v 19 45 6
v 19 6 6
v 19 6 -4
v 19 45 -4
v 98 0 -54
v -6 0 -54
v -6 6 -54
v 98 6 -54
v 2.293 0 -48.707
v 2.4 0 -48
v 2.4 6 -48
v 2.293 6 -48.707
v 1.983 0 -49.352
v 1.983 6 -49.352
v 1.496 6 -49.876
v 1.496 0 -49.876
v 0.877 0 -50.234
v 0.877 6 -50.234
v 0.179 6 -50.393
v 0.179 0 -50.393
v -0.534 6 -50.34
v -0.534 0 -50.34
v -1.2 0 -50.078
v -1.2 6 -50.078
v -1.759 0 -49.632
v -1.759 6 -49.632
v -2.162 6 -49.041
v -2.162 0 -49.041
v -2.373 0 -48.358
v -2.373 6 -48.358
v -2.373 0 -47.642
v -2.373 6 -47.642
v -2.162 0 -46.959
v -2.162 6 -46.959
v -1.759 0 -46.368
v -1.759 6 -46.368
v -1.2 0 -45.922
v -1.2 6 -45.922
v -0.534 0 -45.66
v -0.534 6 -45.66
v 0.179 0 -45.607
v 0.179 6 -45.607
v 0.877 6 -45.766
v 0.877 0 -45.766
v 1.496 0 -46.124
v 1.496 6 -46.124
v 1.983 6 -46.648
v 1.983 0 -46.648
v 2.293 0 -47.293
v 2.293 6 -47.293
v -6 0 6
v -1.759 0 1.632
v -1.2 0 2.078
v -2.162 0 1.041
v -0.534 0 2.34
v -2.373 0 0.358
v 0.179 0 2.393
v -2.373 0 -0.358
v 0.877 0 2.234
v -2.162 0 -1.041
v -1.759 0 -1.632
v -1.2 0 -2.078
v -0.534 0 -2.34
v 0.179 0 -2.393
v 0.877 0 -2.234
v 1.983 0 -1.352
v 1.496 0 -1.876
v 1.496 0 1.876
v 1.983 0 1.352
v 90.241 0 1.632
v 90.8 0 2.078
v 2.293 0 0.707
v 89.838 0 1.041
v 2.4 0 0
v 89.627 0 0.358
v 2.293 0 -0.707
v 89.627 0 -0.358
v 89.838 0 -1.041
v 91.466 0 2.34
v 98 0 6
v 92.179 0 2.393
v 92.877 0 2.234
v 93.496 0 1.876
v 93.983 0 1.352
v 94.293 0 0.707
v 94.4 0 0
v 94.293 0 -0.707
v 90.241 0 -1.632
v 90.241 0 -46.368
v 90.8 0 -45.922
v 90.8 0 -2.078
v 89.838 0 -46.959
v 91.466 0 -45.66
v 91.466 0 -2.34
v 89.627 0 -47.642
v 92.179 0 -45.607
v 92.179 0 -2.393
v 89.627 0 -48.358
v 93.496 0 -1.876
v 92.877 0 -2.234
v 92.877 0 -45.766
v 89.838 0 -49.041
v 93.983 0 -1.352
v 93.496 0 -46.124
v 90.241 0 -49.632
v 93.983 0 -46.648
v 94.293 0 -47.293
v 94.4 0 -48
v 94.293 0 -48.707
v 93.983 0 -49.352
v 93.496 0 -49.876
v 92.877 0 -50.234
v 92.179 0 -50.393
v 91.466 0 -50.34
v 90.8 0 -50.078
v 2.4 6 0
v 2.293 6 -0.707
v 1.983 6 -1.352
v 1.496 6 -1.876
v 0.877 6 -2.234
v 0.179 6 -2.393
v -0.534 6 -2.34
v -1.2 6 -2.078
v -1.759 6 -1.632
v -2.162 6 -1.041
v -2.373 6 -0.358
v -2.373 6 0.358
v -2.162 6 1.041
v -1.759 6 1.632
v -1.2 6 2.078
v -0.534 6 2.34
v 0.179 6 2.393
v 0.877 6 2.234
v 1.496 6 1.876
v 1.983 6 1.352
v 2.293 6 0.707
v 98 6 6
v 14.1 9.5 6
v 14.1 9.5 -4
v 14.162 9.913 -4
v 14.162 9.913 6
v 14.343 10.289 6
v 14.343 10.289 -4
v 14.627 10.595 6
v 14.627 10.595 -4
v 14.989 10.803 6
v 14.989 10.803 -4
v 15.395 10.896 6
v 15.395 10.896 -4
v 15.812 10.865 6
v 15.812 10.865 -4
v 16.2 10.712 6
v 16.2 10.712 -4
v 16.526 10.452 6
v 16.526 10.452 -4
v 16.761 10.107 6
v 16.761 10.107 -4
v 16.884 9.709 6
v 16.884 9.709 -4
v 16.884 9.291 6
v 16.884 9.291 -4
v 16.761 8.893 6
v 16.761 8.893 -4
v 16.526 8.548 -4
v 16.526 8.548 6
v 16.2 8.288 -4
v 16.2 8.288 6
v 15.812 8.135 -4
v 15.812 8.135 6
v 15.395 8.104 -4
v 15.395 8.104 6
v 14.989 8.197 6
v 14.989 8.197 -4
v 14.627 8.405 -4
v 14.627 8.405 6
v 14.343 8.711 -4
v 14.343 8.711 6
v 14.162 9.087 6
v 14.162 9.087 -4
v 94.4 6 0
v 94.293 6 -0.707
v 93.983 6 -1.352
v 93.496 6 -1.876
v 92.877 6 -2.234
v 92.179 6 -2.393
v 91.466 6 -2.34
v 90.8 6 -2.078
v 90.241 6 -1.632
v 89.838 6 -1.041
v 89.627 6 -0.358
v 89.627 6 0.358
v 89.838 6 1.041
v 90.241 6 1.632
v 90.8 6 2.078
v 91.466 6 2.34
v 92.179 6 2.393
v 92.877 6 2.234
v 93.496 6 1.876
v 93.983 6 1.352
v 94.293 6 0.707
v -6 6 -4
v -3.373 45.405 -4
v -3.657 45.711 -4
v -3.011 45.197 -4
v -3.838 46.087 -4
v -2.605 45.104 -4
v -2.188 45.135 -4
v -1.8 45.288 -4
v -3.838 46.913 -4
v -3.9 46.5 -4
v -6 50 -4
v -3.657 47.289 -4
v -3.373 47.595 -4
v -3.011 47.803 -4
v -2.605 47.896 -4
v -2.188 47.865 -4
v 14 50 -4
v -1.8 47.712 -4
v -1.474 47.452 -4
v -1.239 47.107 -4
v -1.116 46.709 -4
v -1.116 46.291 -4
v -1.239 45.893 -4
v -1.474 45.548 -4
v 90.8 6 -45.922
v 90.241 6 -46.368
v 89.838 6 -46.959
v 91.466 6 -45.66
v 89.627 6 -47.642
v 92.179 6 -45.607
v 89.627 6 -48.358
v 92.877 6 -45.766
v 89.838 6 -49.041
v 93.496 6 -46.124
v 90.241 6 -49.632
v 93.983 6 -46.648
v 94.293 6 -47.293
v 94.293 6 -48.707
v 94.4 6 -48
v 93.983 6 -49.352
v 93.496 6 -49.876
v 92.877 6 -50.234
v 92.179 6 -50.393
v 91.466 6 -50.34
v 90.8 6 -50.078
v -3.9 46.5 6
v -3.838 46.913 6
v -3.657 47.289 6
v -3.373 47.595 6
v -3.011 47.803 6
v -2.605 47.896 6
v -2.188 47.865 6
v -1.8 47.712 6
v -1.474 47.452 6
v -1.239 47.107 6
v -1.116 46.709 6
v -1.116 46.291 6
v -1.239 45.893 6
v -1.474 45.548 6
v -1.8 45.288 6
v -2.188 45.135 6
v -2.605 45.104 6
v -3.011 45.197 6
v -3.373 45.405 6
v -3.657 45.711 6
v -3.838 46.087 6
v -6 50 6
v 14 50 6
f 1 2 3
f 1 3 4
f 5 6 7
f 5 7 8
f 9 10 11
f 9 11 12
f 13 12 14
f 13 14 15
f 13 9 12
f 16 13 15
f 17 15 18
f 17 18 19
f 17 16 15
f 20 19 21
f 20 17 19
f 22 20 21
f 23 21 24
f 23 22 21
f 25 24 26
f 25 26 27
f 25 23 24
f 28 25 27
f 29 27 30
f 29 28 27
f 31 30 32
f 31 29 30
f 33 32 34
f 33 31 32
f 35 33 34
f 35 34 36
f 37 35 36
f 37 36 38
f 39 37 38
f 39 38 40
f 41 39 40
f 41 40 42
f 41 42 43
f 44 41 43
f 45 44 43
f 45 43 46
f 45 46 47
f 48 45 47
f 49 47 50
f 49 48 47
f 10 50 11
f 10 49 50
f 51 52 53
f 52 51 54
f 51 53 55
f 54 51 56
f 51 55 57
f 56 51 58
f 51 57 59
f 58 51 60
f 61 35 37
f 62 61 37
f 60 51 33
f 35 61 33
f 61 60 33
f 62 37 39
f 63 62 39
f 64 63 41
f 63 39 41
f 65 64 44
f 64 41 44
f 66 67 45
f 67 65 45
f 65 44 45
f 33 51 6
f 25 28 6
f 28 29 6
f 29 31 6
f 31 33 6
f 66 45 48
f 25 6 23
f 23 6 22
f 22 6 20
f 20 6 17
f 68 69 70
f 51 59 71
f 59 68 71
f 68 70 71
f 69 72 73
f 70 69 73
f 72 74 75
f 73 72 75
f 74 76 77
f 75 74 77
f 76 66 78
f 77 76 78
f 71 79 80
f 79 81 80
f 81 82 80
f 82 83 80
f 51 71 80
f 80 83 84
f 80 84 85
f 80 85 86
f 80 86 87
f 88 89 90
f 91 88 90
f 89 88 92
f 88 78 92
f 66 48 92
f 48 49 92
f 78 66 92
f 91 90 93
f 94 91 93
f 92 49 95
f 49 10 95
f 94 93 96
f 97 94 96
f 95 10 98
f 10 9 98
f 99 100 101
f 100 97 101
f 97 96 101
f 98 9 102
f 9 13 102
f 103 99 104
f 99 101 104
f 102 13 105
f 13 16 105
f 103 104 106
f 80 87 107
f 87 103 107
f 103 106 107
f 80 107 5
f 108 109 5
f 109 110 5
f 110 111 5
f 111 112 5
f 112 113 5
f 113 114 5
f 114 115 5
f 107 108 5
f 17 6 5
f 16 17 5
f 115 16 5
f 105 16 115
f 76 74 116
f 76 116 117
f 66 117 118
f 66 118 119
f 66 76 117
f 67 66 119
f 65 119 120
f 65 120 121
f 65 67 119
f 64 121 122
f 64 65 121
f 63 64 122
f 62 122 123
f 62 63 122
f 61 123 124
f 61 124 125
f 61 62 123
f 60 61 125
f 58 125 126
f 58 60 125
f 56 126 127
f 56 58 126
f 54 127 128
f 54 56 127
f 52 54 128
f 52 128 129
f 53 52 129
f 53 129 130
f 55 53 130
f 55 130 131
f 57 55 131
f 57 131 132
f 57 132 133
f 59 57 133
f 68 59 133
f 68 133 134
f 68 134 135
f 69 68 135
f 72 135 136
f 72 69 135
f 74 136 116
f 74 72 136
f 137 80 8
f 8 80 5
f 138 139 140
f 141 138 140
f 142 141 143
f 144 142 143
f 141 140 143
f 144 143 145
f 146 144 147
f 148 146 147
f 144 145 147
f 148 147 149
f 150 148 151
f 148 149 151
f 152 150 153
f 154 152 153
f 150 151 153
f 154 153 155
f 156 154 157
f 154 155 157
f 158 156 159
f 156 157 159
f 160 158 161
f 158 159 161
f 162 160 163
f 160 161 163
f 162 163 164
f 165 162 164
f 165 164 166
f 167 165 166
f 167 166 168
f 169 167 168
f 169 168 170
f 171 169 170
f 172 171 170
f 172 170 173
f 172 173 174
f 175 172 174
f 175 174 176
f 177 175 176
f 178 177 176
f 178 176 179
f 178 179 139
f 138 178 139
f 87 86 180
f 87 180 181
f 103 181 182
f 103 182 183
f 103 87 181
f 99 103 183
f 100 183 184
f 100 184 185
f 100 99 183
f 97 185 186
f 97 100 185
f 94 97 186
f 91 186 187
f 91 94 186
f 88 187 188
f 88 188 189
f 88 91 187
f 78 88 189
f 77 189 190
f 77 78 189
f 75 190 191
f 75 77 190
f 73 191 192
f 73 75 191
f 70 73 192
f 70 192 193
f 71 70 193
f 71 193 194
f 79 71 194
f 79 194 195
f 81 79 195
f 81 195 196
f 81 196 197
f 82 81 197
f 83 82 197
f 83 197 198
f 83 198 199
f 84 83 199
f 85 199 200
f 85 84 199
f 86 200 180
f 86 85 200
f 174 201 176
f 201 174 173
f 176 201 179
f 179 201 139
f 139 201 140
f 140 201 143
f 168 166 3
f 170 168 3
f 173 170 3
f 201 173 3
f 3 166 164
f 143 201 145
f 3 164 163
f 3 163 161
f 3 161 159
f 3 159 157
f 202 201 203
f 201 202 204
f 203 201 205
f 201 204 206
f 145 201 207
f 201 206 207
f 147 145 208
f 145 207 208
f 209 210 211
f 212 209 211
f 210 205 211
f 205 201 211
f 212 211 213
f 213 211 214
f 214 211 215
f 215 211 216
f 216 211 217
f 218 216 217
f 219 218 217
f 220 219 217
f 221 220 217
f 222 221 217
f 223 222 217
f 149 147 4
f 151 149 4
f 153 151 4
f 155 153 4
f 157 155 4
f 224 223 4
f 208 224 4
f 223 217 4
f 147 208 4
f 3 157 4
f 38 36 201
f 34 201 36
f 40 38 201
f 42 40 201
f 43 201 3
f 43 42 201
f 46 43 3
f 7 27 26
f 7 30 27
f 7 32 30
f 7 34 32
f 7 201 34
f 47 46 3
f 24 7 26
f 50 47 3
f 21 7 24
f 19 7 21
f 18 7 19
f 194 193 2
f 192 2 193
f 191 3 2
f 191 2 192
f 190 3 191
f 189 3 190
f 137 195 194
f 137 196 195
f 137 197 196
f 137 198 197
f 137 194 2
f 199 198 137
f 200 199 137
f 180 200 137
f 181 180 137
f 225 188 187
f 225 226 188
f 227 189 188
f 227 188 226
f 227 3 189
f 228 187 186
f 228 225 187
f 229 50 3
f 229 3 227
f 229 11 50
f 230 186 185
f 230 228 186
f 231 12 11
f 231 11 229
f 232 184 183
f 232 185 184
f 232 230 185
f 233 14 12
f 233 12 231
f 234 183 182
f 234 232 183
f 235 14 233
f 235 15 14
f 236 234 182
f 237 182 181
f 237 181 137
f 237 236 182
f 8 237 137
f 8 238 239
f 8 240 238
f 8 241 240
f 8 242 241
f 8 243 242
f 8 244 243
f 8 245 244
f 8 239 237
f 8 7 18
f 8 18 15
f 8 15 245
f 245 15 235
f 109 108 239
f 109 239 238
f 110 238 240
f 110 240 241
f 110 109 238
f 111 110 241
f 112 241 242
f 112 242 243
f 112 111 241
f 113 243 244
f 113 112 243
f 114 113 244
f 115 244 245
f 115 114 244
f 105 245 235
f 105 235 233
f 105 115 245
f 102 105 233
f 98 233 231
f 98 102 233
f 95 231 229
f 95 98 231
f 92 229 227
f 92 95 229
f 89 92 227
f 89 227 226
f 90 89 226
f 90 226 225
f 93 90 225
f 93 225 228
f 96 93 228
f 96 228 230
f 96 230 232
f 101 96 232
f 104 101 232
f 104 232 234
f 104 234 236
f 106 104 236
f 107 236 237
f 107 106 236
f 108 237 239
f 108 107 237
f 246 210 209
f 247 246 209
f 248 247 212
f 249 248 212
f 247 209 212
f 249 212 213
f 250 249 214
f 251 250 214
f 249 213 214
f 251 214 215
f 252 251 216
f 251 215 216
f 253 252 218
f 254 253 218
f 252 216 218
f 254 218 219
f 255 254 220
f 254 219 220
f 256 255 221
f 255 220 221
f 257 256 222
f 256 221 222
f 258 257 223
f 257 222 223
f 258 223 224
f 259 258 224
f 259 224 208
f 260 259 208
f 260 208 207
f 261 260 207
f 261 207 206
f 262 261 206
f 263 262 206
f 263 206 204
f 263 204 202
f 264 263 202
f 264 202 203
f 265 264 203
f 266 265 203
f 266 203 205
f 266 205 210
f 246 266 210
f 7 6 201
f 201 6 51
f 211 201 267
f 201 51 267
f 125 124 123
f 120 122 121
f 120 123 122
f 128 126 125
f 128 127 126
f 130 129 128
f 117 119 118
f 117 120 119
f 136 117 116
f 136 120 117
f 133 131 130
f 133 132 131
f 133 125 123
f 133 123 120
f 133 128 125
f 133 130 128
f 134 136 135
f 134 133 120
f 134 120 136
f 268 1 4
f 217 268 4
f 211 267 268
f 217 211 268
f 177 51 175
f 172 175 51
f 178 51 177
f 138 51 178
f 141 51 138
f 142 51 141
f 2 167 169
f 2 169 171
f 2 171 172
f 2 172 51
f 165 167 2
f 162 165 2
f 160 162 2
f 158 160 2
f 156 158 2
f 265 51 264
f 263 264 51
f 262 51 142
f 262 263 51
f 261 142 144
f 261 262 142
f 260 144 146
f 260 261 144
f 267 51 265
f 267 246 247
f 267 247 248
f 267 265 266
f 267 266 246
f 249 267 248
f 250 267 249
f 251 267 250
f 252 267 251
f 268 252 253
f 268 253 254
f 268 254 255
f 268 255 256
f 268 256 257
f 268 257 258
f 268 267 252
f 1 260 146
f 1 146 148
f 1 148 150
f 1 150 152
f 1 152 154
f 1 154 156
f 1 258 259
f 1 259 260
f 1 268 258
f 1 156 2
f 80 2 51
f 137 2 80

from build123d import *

# Parameters (mm, degrees)
SKETCH1_W           = 104
SKETCH1_H           = 60
SKETCH1_R           = 2.4
BOSS_EXTRUDE1_DEPTH = 6
SKETCH2_W           = 25
SKETCH2_H           = 44
BOSS_EXTRUDE2_DEPTH = 10
SKETCH3_R           = 1.4
CUT_EXTRUDE1_DEPTH  = 11
CHAMFER1_SIZE       = 5


with BuildPart() as part:
    # Sketch1 → Boss-Extrude1 (new body)
    with BuildSketch(Plane(origin=(0, 0, 0), x_dir=(1, 0, 0), z_dir=(0, 1, 0))):
        with Locations((46, 24)):
            Rectangle(SKETCH1_W, SKETCH1_H)
        with Locations((0, 48)):
            Circle(SKETCH1_R, mode=Mode.SUBTRACT)
        with Locations((92, 48)):
            Circle(SKETCH1_R, mode=Mode.SUBTRACT)
        with Locations((92, 0)):
            Circle(SKETCH1_R, mode=Mode.SUBTRACT)
        Circle(SKETCH1_R, mode=Mode.SUBTRACT)
    extrude(amount=BOSS_EXTRUDE1_DEPTH)

    # Sketch2 → Boss-Extrude2 (add)
    with BuildSketch(Plane.XY.offset(6)):
        with Locations((6.5, 28)):
            Rectangle(SKETCH2_W, SKETCH2_H)
    extrude(amount=-BOSS_EXTRUDE2_DEPTH)

    # Sketch3 → Cut-Extrude1 (cut, through all)
    with BuildSketch(Plane(origin=(0, 0, -4), x_dir=(-1, 0, 0), z_dir=(0, 0, -1))):
        with Locations((-15.5, 9.5)):
            Circle(SKETCH3_R)
        with Locations((2.5, 46.5)):
            Circle(SKETCH3_R)
    extrude(amount=-CUT_EXTRUDE1_DEPTH, mode=Mode.SUBTRACT)

    # Chamfer1
    chamfer1_edges = [part.edges().sort_by_distance(p)[0] for p in [
        (19, 50, 1),
    ]]
    chamfer(chamfer1_edges, length=CHAMFER1_SIZE)


solid = part.part
